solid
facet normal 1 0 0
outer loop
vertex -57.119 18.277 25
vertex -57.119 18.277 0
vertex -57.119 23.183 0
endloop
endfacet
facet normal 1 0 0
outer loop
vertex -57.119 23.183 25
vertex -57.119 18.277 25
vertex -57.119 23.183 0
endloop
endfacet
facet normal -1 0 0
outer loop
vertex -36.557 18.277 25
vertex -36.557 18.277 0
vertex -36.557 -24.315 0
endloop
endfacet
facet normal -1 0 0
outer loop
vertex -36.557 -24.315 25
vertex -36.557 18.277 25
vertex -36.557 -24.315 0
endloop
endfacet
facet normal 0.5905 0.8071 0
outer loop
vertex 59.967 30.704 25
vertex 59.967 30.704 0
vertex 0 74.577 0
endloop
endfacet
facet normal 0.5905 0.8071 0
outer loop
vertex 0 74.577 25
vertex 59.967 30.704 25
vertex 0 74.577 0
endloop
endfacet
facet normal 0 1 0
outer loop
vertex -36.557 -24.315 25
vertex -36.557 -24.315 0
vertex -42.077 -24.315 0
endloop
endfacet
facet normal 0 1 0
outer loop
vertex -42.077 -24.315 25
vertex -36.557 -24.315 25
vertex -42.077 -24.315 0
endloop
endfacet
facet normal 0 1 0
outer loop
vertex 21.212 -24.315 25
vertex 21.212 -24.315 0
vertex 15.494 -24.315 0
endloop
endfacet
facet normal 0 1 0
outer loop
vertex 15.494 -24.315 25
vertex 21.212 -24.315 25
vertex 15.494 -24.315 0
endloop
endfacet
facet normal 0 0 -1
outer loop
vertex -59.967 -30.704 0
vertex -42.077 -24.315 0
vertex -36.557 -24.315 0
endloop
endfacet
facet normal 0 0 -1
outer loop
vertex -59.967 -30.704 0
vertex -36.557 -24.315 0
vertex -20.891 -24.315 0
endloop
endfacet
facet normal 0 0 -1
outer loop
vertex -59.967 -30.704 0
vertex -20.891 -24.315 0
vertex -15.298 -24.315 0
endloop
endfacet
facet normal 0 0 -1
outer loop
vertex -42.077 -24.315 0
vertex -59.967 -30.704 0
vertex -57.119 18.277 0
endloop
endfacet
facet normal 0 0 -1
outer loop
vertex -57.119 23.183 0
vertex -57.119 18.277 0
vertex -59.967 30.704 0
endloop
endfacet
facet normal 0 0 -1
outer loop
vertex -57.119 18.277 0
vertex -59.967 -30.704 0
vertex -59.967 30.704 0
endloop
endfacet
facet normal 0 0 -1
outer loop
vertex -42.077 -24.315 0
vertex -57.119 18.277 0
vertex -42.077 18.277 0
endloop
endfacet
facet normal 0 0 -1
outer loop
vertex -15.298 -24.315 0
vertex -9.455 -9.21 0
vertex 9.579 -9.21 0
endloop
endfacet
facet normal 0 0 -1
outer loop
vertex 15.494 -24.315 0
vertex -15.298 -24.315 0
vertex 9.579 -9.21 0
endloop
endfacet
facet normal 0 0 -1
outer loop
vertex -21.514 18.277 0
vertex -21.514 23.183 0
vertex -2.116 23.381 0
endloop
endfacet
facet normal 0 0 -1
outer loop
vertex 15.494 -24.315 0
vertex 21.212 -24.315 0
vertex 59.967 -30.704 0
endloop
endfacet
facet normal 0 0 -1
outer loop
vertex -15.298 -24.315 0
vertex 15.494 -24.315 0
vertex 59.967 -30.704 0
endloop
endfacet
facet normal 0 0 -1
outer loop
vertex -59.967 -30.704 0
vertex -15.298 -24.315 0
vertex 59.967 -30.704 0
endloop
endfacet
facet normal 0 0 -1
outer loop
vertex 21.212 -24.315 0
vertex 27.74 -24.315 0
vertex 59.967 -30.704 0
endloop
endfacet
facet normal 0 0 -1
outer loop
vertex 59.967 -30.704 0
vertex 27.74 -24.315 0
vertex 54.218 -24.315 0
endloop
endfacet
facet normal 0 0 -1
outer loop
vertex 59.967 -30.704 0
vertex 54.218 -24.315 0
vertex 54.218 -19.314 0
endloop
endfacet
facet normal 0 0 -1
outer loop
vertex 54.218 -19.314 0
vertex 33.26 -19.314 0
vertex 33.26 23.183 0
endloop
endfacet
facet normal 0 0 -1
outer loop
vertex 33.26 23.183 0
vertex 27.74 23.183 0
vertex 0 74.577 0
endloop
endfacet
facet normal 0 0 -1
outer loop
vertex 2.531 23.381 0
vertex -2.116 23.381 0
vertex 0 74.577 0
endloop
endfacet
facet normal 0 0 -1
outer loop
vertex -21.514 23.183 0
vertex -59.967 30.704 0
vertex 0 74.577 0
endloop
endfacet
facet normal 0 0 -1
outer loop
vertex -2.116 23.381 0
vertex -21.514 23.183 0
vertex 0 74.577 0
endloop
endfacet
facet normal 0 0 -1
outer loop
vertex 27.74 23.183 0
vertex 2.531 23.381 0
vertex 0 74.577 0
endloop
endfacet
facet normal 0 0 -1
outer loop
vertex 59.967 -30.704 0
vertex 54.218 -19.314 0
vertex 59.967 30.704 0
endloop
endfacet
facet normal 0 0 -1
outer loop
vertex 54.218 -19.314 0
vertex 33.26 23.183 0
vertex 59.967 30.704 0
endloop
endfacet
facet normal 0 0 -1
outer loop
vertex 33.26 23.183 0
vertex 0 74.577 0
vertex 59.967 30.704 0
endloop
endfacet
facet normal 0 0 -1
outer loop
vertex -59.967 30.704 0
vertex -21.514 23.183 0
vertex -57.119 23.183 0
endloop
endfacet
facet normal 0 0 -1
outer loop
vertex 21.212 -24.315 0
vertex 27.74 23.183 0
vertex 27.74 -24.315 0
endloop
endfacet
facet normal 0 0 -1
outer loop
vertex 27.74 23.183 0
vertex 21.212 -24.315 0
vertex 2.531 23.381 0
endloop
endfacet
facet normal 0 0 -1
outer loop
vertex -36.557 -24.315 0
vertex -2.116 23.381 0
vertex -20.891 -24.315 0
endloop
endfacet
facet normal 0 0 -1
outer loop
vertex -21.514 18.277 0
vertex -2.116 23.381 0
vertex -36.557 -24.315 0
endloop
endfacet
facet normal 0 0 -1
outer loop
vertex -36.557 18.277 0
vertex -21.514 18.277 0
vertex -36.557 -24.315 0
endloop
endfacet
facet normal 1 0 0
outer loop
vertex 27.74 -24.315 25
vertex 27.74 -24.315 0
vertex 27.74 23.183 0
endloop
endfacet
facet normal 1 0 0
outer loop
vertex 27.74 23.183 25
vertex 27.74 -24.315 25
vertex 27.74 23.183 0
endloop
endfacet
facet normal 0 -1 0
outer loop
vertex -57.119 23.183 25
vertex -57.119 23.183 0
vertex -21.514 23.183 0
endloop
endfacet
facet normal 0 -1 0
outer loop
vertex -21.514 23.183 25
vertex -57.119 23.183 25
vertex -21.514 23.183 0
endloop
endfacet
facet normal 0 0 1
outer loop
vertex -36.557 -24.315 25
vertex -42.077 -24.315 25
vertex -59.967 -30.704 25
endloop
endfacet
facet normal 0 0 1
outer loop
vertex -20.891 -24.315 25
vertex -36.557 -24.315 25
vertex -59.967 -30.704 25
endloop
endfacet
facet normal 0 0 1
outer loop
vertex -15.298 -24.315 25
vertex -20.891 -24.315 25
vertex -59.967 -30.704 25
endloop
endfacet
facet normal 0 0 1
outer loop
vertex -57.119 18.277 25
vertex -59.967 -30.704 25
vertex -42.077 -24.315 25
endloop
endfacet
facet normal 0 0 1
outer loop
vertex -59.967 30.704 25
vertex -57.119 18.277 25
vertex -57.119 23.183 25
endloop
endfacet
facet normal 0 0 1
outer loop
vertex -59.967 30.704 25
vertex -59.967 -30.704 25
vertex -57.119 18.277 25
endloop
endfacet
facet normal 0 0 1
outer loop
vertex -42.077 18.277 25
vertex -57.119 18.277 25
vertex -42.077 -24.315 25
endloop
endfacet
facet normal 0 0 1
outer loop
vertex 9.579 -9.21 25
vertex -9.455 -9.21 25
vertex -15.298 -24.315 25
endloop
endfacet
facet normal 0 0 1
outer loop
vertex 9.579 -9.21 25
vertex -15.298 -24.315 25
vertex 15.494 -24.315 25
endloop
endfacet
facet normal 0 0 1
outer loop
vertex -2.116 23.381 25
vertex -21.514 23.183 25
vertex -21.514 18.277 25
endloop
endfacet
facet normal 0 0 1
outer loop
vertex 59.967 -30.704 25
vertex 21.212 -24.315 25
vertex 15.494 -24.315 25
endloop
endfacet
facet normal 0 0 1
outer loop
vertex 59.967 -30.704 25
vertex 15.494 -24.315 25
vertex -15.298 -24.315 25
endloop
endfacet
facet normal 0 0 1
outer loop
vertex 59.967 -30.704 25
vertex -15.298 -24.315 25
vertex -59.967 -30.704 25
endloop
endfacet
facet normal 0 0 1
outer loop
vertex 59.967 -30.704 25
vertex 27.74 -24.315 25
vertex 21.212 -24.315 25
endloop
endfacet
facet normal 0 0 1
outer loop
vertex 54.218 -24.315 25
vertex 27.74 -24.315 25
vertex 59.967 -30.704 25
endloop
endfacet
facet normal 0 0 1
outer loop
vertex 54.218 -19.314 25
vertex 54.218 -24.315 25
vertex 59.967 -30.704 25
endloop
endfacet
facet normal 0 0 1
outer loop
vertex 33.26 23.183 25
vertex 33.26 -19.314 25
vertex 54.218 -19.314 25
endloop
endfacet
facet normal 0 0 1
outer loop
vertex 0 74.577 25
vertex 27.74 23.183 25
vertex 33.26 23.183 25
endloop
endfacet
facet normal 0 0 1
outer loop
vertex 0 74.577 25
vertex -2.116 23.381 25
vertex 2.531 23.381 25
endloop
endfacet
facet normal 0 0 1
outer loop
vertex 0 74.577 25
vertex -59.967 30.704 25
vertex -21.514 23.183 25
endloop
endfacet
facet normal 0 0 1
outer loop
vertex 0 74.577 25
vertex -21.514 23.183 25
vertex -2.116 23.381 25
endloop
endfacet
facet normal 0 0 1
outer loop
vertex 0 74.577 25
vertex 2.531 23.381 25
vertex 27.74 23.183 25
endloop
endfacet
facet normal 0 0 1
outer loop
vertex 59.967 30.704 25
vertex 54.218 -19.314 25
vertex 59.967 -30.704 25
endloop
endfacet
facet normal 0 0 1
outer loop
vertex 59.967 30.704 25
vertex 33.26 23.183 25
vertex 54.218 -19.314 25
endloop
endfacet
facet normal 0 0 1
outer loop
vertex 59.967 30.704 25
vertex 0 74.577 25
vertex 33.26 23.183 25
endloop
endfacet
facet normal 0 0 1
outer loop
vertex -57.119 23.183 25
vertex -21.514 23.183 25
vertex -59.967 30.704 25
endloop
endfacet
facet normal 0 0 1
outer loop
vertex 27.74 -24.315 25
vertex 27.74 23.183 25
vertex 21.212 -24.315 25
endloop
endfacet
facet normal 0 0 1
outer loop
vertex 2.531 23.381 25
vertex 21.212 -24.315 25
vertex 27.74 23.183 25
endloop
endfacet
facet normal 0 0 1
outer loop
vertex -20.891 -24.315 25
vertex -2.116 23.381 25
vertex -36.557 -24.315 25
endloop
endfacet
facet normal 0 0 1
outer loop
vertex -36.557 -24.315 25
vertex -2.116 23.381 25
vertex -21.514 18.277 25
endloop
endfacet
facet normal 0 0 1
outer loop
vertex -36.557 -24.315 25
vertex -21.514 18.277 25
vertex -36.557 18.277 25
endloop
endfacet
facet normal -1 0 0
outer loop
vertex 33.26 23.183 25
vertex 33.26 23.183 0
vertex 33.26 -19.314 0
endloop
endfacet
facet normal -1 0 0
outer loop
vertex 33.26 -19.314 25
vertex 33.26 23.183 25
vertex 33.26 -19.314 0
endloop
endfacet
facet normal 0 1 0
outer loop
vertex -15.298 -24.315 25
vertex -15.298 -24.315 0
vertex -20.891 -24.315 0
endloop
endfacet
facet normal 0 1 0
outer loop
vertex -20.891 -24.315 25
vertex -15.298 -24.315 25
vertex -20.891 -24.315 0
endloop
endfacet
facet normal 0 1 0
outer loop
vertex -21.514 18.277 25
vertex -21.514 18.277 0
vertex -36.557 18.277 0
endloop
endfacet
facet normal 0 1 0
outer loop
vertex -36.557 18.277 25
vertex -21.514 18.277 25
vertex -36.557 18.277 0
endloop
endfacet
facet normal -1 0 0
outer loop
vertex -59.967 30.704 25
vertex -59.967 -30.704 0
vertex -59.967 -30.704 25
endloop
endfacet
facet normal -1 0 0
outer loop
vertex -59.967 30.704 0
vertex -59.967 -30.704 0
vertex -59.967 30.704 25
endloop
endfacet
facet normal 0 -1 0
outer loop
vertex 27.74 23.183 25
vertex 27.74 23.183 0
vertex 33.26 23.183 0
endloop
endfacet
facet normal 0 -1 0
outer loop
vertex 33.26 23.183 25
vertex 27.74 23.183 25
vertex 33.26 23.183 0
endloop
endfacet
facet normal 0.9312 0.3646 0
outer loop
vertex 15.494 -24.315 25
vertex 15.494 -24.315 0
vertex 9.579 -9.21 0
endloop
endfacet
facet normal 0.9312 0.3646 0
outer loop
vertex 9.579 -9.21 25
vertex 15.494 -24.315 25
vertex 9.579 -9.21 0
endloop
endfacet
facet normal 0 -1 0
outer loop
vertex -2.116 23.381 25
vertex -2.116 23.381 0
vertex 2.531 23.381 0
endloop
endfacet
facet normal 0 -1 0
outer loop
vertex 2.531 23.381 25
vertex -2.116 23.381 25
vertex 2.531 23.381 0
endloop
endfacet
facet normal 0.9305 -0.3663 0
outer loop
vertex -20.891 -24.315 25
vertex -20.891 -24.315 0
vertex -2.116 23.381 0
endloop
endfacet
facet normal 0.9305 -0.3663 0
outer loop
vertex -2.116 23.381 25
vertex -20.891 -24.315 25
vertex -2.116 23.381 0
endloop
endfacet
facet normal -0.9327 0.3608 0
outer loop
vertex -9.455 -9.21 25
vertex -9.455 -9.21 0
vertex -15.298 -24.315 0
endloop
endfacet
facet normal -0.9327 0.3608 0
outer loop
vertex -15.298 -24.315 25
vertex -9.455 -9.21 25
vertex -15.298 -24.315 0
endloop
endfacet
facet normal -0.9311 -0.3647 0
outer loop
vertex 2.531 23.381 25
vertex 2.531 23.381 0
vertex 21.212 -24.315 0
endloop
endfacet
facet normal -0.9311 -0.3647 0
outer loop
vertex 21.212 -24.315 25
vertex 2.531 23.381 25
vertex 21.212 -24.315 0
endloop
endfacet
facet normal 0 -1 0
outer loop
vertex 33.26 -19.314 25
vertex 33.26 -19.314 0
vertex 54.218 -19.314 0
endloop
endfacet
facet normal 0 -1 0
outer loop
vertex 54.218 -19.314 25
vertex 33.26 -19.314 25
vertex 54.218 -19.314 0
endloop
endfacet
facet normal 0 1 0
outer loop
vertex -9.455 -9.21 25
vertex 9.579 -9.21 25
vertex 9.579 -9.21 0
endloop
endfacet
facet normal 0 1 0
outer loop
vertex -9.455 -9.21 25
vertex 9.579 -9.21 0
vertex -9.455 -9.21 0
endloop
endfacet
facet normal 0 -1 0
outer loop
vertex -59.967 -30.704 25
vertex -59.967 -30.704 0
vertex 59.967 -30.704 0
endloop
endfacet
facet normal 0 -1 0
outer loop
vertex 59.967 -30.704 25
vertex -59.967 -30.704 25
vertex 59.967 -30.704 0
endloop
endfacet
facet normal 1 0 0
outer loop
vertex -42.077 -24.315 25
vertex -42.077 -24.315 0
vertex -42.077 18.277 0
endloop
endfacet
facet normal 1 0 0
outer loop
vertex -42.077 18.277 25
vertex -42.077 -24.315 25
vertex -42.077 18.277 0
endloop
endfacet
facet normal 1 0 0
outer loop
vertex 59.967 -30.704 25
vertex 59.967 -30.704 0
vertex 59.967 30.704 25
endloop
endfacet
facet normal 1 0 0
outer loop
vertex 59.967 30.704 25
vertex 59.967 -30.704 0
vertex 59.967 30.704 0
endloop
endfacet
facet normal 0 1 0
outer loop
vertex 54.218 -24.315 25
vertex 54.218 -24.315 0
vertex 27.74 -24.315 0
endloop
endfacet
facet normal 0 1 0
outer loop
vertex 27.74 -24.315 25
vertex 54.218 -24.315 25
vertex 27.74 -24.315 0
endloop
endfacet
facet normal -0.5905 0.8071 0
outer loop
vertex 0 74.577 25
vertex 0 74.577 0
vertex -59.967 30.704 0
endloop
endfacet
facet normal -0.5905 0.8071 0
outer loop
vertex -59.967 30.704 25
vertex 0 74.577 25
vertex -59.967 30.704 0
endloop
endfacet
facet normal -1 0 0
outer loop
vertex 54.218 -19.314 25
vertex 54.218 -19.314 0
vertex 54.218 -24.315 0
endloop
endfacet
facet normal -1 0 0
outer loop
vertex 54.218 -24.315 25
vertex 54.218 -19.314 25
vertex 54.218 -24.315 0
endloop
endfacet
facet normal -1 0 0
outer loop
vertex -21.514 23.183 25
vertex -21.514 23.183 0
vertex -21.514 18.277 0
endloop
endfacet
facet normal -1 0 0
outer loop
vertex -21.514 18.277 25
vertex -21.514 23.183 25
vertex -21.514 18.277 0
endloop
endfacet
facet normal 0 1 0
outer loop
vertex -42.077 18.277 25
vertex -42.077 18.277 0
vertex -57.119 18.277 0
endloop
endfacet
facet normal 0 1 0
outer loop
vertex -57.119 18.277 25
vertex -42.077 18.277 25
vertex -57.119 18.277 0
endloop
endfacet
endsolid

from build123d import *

# Parameters (mm, degrees)
F1_DEPTH = 25
F0_W     = 119.9337523431
F0_H     = 61.4086027442
F2_DEPTH = 25
F3_DEPTH = 25


with BuildPart() as f1:
    # F0 (on Top) → F1 (new body)
    with BuildSketch(Plane.XY):
        Polygon((-59.9668761715, 30.7043013721), (59.9668761715, 30.7043013721), (0, 74.5766162872), align=None)
    extrude(amount=F1_DEPTH)

    # F0 (on Top) → F2 (join)
    with BuildSketch(Plane.XY):
        Rectangle(F0_W, F0_H)
        Polygon((-36.5568330017, 18.276524249), (-36.5568330017, -24.3145190179), (-42.0769316042, -24.3145190179), (-42.0769316042, 18.276524249), (-57.1194601879, 18.276524249), (-57.1194601879, 23.1832785624), (-21.514304418, 23.1832785624), (-21.514304418, 18.276524249), align=None, mode=Mode.SUBTRACT)
        Polygon((21.2118825059, -24.3145190179), (15.4942662508, -24.3145190179), (9.5791323434, -9.2096164388), (-9.4553319529, -9.2096164388), (-15.2976961989, -24.3145190179), (-20.8905644629, -24.3145190179), (-2.1159918146, 23.3807962149), (2.5308708508, 23.3807962149), align=None, mode=Mode.SUBTRACT)
        Polygon((54.2181217962, -24.3145190179), (27.7403607025, -24.3145190179), (27.7403607025, 23.1832785624), (33.2604593051, 23.1832785624), (33.2604593051, -19.3142037113), (54.2181217962, -19.3142037113), align=None, mode=Mode.SUBTRACT)
        Polygon((-59.9668761715, 30.7043013721), (59.9668761715, 30.7043013721), (0, 74.5766162872), align=None)
    extrude(amount=F2_DEPTH)

    # F0 (on Top) → F3 (join)
    with BuildSketch(Plane.XY):
        Rectangle(F0_W, F0_H)
        Polygon((-36.5568330017, 18.276524249), (-36.5568330017, -24.3145190179), (-42.0769316042, -24.3145190179), (-42.0769316042, 18.276524249), (-57.1194601879, 18.276524249), (-57.1194601879, 23.1832785624), (-21.514304418, 23.1832785624), (-21.514304418, 18.276524249), align=None, mode=Mode.SUBTRACT)
        Polygon((21.2118825059, -24.3145190179), (15.4942662508, -24.3145190179), (9.5791323434, -9.2096164388), (-9.4553319529, -9.2096164388), (-15.2976961989, -24.3145190179), (-20.8905644629, -24.3145190179), (-2.1159918146, 23.3807962149), (2.5308708508, 23.3807962149), align=None, mode=Mode.SUBTRACT)
        Polygon((54.2181217962, -24.3145190179), (27.7403607025, -24.3145190179), (27.7403607025, 23.1832785624), (33.2604593051, 23.1832785624), (33.2604593051, -19.3142037113), (54.2181217962, -19.3142037113), align=None, mode=Mode.SUBTRACT)
    extrude(amount=F3_DEPTH)


solid = f1.part
